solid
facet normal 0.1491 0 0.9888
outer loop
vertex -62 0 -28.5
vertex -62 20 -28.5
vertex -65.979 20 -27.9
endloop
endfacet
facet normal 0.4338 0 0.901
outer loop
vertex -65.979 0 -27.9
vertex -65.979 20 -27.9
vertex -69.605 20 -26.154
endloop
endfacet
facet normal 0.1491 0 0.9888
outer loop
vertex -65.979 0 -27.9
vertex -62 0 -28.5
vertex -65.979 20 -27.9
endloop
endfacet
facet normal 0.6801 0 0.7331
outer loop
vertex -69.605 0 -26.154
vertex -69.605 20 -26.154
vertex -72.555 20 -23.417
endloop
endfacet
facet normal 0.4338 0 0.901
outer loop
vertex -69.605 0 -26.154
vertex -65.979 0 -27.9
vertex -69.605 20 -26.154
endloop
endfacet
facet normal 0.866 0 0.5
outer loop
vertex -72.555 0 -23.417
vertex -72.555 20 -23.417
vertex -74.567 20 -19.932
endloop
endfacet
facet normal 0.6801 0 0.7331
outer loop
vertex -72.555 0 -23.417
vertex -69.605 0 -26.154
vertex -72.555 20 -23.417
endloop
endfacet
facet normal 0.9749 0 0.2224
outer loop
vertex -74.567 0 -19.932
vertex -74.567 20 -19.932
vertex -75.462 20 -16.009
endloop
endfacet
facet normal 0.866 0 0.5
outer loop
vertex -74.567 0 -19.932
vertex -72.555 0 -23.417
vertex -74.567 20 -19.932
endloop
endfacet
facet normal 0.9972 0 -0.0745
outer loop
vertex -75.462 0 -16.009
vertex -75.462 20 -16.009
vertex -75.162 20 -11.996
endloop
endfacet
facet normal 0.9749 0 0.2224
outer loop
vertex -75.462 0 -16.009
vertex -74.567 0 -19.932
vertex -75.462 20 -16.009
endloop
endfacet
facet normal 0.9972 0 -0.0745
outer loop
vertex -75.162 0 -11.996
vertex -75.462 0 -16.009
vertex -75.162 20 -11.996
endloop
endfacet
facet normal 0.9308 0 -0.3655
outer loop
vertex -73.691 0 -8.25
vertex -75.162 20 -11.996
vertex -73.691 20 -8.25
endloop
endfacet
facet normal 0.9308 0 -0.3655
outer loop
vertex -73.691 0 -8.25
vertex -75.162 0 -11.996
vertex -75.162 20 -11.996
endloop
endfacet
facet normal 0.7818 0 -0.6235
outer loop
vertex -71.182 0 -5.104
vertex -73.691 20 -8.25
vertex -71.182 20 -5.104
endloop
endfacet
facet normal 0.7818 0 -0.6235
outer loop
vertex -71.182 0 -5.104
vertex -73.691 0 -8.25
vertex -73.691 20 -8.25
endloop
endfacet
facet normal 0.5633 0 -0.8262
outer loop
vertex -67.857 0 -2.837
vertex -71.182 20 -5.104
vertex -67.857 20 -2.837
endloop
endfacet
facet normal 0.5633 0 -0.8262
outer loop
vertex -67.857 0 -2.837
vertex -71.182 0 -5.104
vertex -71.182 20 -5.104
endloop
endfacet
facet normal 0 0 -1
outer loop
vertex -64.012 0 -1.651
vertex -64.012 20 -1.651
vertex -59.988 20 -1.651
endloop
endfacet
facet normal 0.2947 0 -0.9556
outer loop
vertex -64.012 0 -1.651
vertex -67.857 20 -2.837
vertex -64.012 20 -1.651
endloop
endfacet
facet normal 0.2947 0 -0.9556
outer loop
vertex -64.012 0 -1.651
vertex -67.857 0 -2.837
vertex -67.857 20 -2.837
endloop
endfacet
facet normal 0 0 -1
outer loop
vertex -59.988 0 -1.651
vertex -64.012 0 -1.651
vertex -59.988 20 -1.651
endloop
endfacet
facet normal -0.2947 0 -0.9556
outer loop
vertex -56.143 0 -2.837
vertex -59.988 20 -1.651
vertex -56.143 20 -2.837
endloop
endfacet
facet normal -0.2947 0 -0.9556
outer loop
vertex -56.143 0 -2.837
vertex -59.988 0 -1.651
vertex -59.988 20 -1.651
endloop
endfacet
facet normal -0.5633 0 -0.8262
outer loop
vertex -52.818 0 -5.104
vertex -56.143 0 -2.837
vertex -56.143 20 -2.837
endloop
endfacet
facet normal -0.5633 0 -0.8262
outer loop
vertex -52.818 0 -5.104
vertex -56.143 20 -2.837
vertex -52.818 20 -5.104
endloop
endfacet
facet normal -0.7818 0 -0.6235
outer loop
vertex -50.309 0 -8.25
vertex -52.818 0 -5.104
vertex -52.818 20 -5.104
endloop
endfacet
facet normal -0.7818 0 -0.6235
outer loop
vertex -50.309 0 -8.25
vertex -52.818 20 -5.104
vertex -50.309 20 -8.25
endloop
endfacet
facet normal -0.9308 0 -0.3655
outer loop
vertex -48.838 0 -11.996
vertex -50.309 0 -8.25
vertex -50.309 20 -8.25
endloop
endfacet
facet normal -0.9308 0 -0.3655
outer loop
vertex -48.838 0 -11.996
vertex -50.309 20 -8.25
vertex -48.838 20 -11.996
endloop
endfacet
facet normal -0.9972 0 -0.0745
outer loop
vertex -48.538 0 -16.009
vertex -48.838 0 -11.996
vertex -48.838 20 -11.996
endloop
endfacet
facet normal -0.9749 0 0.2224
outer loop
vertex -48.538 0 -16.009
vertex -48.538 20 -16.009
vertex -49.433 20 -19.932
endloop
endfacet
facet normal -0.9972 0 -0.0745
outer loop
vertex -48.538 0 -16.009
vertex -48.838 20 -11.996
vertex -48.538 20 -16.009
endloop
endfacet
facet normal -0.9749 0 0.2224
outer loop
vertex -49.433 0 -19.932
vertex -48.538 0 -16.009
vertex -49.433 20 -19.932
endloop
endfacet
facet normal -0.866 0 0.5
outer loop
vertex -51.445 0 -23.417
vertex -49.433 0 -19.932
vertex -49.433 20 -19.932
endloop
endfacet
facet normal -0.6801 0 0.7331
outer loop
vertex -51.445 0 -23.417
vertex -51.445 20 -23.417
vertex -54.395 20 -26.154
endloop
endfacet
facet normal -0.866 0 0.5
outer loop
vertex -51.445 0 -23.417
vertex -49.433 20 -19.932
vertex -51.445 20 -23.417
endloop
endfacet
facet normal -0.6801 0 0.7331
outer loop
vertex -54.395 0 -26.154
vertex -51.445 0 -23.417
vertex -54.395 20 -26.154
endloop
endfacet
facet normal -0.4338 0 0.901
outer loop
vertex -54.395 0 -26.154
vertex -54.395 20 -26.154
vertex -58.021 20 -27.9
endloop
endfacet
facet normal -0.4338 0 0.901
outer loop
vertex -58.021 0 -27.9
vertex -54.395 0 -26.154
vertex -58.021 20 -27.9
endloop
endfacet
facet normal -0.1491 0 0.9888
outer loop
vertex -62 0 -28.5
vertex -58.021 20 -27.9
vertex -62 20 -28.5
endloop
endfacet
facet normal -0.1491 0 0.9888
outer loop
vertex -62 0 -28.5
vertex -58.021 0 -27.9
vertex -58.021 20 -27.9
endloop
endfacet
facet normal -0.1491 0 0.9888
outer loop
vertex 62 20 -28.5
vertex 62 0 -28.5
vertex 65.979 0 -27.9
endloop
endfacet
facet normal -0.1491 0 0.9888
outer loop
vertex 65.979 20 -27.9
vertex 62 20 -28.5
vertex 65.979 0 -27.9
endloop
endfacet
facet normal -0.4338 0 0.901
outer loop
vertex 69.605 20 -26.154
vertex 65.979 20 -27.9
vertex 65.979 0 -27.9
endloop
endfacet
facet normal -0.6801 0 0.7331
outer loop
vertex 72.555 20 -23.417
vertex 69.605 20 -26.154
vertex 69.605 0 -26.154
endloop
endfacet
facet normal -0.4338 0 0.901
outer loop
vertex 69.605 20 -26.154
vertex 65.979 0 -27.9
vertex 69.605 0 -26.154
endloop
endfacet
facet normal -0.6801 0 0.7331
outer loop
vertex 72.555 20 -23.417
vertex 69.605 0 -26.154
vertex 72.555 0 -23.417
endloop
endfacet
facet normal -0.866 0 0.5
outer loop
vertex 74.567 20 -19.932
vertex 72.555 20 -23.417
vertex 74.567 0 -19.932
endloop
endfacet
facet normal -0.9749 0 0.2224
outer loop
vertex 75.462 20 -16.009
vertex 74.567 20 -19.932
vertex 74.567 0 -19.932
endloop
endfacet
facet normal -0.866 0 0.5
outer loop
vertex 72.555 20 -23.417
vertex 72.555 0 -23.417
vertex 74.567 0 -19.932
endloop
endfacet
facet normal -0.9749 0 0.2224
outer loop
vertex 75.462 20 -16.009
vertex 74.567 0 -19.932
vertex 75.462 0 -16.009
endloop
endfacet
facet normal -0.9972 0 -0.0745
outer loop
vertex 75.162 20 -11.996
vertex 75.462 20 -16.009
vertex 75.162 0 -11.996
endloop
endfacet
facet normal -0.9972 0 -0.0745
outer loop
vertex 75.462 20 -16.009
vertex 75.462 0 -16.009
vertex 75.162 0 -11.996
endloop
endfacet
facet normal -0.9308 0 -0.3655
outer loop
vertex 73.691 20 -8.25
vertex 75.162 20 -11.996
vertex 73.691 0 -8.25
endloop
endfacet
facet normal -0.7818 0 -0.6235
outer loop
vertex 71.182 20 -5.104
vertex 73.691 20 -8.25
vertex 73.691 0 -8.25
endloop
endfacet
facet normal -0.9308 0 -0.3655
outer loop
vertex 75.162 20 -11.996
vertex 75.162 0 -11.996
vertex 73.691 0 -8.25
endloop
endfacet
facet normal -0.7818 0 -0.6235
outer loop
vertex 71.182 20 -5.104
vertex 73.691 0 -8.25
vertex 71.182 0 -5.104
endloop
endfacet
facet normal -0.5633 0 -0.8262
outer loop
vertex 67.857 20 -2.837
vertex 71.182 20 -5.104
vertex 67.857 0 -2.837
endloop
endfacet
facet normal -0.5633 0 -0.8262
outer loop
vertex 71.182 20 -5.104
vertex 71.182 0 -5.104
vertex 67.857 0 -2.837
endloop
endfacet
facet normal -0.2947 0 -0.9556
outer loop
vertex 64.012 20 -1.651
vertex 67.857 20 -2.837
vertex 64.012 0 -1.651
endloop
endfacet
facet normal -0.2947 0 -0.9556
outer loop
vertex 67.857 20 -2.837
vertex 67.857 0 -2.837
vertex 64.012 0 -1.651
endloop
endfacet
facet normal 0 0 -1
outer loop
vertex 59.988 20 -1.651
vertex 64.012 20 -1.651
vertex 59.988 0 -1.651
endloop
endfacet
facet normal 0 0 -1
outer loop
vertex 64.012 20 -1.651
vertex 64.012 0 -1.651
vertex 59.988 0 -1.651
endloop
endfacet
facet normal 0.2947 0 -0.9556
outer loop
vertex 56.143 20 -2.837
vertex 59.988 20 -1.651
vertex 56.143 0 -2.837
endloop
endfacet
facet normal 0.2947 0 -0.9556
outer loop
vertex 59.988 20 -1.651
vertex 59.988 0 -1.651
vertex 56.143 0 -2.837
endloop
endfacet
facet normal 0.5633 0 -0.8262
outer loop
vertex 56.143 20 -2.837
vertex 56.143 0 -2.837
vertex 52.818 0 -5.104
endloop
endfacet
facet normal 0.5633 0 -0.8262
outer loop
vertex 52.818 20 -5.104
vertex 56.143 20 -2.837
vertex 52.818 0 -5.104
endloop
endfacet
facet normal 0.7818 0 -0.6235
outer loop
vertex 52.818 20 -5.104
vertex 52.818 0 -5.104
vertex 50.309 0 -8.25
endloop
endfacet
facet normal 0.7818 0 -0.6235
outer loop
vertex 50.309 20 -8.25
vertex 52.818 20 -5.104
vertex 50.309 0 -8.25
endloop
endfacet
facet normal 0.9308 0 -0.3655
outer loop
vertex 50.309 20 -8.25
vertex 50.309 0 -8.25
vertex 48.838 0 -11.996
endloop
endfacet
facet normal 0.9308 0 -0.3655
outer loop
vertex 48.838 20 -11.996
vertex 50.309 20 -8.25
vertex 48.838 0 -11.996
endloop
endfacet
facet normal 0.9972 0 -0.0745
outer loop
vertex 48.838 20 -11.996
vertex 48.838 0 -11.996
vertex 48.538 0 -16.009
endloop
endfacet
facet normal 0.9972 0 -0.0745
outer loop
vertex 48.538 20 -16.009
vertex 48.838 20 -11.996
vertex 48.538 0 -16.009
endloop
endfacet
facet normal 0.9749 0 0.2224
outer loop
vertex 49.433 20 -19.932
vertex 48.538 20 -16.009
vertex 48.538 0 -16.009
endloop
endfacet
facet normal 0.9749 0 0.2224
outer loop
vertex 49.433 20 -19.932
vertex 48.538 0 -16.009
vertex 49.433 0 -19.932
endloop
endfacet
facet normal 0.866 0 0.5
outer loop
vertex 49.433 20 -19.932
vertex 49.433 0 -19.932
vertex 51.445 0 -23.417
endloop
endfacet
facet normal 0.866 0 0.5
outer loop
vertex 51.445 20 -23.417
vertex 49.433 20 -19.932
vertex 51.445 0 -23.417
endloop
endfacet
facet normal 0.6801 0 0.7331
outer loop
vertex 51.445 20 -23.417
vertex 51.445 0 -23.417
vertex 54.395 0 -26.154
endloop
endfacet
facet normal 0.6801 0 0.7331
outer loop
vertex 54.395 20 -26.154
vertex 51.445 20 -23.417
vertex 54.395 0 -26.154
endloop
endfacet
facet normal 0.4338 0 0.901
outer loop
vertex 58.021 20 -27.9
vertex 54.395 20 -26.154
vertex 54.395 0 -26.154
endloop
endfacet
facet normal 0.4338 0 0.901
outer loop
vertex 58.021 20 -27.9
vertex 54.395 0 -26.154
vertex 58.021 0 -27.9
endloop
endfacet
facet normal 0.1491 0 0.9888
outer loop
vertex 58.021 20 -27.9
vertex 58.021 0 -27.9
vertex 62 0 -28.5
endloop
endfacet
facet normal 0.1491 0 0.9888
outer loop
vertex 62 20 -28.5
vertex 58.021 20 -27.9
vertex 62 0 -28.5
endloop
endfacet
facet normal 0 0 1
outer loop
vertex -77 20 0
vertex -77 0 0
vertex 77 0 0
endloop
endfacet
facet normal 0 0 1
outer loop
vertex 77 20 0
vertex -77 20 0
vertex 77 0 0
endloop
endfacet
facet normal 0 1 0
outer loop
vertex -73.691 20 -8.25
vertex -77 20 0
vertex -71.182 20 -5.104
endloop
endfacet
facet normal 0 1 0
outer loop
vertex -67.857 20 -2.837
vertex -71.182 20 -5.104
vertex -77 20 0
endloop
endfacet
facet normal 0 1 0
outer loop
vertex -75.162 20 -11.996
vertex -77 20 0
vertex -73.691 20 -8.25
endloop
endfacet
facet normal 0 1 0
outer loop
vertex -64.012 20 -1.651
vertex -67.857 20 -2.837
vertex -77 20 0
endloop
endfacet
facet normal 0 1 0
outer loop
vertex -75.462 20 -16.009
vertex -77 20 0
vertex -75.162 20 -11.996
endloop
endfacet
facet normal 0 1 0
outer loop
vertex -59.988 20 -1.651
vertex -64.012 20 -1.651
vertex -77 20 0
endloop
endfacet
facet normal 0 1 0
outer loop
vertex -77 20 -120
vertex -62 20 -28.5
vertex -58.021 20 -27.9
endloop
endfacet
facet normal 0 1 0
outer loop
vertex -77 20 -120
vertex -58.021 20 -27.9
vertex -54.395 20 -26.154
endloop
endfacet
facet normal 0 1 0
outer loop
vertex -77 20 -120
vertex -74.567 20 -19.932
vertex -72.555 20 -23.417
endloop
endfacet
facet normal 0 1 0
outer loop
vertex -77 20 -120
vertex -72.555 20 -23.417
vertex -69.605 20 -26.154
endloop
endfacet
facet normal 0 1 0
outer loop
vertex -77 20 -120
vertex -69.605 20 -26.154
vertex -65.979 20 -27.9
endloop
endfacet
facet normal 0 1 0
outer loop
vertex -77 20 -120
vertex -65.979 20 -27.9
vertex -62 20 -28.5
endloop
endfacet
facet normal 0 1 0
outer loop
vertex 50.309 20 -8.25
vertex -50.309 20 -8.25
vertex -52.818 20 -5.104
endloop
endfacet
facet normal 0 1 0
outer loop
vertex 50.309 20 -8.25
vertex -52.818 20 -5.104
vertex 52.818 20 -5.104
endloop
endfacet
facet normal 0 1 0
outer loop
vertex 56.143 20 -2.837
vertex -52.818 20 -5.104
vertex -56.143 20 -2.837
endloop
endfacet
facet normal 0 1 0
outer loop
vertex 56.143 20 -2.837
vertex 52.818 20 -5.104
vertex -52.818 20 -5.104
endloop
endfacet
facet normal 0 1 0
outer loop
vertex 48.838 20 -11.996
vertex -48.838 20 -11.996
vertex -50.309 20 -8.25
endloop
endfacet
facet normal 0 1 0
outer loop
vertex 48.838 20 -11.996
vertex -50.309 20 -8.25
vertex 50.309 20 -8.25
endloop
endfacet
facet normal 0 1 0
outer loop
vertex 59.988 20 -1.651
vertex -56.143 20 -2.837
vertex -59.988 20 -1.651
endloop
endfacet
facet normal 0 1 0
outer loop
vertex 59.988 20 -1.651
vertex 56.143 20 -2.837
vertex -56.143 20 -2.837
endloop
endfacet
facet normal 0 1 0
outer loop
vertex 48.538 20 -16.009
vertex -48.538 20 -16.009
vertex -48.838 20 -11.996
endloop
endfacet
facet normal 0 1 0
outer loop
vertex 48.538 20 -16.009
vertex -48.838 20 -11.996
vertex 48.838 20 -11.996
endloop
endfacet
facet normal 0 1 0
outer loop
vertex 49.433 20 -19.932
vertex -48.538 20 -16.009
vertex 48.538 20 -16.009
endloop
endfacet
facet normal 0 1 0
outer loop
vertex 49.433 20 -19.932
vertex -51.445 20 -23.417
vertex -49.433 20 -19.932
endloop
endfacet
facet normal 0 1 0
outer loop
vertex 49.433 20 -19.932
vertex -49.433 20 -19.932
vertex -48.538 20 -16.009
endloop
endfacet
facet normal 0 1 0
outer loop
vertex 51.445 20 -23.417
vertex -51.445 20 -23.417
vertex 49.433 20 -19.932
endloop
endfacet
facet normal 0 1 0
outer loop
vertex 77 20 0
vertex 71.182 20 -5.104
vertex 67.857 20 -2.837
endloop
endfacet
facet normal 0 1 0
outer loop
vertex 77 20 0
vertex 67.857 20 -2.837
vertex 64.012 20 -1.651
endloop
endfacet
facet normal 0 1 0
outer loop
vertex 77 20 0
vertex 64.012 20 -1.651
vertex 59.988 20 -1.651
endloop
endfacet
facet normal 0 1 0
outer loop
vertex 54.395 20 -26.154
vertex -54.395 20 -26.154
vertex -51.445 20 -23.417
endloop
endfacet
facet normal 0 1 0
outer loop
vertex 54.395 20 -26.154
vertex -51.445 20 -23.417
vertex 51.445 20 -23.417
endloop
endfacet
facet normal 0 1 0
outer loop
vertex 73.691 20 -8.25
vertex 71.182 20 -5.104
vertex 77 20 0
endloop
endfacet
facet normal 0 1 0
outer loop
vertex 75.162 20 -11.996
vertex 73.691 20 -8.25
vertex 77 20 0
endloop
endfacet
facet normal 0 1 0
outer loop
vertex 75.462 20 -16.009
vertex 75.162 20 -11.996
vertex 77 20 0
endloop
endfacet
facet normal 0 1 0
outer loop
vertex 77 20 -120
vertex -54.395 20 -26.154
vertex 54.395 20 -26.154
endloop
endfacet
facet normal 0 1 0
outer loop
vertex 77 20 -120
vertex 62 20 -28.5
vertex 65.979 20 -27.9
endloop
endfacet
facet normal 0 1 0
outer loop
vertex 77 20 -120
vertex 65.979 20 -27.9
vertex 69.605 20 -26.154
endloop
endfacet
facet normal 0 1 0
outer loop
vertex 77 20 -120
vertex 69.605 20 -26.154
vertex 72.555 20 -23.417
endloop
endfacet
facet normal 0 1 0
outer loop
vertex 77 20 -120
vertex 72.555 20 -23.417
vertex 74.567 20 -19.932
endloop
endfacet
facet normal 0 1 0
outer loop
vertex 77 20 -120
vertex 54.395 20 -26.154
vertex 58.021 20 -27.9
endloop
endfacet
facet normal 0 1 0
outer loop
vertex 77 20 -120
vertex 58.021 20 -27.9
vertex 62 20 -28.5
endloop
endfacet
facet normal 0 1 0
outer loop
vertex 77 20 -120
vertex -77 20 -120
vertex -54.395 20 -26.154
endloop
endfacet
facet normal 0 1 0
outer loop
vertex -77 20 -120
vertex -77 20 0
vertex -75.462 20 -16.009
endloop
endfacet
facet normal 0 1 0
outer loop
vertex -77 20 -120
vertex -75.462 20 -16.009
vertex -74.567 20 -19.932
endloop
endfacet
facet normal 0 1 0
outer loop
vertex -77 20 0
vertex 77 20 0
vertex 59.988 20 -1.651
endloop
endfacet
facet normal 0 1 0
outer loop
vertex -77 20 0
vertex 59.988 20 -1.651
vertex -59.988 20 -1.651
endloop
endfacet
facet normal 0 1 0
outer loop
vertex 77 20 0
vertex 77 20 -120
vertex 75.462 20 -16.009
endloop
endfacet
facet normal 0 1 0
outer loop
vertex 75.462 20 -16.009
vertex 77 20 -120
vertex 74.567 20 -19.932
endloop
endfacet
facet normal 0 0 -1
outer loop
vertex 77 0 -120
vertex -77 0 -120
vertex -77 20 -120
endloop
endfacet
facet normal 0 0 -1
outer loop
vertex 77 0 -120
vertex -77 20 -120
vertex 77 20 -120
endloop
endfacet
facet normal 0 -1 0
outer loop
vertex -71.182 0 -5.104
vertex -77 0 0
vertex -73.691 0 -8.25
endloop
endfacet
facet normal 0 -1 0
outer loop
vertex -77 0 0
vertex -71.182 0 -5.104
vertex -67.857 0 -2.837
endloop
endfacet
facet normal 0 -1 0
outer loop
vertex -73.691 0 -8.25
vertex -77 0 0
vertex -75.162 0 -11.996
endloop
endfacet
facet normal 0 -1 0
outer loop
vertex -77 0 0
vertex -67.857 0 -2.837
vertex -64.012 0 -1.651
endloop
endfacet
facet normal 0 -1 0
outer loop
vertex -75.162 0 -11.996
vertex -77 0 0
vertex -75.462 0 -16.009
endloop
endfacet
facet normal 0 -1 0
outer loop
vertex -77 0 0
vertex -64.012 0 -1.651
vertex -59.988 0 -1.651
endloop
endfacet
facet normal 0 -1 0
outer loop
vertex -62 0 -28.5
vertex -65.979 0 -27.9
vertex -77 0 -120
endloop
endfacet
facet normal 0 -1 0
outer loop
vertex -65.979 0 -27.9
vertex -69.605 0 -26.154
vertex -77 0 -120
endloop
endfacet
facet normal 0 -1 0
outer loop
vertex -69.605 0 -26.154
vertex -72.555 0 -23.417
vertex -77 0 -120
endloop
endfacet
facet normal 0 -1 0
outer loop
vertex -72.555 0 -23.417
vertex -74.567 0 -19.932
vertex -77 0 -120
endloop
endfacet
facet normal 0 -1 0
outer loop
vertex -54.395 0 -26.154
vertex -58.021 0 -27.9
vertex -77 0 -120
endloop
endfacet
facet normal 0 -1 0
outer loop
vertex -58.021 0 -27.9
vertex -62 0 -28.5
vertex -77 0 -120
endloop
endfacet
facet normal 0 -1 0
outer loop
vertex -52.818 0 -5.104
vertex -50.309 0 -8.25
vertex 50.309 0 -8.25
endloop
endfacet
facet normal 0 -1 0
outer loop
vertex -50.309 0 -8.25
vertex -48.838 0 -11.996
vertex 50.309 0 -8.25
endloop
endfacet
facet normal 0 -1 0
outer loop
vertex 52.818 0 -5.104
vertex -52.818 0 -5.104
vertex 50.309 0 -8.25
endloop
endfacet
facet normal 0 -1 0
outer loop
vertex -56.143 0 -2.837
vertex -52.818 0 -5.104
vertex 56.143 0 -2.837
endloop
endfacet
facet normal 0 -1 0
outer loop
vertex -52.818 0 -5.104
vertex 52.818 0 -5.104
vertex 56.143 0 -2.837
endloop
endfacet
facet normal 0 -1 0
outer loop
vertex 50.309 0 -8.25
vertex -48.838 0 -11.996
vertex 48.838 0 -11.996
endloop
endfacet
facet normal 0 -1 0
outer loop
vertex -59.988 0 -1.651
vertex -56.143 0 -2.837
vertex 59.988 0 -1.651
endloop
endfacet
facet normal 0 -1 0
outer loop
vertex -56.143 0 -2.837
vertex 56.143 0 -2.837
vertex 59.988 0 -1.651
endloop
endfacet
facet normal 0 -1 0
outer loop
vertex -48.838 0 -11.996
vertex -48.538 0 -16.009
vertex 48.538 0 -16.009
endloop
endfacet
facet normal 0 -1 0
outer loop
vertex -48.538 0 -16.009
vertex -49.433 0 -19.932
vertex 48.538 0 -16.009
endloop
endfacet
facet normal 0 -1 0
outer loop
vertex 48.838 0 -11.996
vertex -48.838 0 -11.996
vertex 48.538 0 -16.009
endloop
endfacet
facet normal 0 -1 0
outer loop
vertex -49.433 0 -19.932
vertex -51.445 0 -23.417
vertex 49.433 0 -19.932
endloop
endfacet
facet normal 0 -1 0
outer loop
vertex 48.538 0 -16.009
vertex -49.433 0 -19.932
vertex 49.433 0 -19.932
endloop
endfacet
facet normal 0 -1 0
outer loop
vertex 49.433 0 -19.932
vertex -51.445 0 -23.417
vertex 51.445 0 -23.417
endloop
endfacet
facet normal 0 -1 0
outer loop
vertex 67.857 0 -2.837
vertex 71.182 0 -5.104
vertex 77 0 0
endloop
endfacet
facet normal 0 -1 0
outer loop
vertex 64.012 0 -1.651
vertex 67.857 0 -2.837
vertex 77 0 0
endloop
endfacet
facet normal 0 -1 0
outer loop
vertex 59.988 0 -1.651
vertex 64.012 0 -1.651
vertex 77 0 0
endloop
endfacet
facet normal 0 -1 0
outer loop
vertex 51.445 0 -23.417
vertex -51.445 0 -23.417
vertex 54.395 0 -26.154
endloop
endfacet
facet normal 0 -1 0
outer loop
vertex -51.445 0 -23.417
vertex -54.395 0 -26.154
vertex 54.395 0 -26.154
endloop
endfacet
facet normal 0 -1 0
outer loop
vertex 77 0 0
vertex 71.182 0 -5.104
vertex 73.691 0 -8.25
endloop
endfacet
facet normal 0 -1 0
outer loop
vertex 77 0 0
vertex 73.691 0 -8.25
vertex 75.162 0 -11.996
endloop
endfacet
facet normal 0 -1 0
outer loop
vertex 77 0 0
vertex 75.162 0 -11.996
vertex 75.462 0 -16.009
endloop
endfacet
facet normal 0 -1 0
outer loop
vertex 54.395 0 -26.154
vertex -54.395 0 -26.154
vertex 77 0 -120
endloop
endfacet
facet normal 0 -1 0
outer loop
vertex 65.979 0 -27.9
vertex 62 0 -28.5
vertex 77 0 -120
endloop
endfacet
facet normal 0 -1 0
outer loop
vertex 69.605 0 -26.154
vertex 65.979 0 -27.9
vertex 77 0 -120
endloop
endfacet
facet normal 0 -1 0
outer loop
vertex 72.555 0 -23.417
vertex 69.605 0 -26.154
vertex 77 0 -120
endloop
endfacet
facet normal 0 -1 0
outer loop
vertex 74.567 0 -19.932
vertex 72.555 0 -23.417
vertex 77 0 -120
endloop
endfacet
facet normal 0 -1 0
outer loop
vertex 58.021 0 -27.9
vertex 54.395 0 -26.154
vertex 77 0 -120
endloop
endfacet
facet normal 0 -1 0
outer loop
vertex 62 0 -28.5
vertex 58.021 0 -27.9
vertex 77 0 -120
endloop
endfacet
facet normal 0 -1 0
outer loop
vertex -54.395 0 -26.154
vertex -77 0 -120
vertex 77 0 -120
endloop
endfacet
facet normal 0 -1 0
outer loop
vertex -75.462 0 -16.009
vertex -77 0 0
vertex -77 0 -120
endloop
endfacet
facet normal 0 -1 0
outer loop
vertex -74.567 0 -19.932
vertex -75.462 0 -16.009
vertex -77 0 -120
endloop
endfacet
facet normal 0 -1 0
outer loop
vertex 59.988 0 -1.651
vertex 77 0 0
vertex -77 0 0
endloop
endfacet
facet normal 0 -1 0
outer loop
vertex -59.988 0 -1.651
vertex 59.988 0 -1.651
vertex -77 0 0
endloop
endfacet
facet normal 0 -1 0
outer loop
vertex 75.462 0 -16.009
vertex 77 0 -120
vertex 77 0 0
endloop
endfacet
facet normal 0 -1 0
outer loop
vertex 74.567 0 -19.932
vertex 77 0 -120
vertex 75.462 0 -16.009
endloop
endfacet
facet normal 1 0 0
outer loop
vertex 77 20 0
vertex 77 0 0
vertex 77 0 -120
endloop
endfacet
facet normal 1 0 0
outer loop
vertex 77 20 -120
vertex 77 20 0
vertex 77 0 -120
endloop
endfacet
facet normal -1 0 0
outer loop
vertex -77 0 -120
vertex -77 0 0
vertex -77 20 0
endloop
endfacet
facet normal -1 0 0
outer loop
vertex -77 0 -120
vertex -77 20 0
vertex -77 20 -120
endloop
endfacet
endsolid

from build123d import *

# Parameters (mm, degrees)
BOSS_EXTRUDE1_OUTLINE_W = 154
BOSS_EXTRUDE1_OUTLINE_H = 120
BOSS_EXTRUDE1_DEPTH     = 20
SKETCH2_R               = 13.5
CUT_EXTRUDE3_DEPTH      = 144.975692393


# Read off the part's stored shape, not the designer's step: Boss-Extrude1
with BuildPart() as part:
    # Boss-Extrude1 outline → Boss-Extrude1 (new body)
    with BuildSketch(Plane(origin=(0, 0, 0), x_dir=(1, 0, 0), z_dir=(0, 1, 0))):
        with Locations((0, 60)):
            Rectangle(BOSS_EXTRUDE1_OUTLINE_W, BOSS_EXTRUDE1_OUTLINE_H)
    extrude(amount=BOSS_EXTRUDE1_DEPTH)

    # Sketch2 → Cut-Extrude3 (cut, through all)
    with BuildSketch(Plane.XZ):
        with Locations(Location((62, -15, 0), (0, 0, 270))):
            Circle(SKETCH2_R)
    cut_extrude3 = extrude(amount=-CUT_EXTRUDE3_DEPTH, mode=Mode.SUBTRACT)

    # Mirror1: Cut-Extrude3 across plane
    add(cut_extrude3.mirror(Plane(origin=(0, 0, 0), x_dir=(0, 0, 1), z_dir=(1, 0, 0))), mode=Mode.SUBTRACT)


solid = part.part
